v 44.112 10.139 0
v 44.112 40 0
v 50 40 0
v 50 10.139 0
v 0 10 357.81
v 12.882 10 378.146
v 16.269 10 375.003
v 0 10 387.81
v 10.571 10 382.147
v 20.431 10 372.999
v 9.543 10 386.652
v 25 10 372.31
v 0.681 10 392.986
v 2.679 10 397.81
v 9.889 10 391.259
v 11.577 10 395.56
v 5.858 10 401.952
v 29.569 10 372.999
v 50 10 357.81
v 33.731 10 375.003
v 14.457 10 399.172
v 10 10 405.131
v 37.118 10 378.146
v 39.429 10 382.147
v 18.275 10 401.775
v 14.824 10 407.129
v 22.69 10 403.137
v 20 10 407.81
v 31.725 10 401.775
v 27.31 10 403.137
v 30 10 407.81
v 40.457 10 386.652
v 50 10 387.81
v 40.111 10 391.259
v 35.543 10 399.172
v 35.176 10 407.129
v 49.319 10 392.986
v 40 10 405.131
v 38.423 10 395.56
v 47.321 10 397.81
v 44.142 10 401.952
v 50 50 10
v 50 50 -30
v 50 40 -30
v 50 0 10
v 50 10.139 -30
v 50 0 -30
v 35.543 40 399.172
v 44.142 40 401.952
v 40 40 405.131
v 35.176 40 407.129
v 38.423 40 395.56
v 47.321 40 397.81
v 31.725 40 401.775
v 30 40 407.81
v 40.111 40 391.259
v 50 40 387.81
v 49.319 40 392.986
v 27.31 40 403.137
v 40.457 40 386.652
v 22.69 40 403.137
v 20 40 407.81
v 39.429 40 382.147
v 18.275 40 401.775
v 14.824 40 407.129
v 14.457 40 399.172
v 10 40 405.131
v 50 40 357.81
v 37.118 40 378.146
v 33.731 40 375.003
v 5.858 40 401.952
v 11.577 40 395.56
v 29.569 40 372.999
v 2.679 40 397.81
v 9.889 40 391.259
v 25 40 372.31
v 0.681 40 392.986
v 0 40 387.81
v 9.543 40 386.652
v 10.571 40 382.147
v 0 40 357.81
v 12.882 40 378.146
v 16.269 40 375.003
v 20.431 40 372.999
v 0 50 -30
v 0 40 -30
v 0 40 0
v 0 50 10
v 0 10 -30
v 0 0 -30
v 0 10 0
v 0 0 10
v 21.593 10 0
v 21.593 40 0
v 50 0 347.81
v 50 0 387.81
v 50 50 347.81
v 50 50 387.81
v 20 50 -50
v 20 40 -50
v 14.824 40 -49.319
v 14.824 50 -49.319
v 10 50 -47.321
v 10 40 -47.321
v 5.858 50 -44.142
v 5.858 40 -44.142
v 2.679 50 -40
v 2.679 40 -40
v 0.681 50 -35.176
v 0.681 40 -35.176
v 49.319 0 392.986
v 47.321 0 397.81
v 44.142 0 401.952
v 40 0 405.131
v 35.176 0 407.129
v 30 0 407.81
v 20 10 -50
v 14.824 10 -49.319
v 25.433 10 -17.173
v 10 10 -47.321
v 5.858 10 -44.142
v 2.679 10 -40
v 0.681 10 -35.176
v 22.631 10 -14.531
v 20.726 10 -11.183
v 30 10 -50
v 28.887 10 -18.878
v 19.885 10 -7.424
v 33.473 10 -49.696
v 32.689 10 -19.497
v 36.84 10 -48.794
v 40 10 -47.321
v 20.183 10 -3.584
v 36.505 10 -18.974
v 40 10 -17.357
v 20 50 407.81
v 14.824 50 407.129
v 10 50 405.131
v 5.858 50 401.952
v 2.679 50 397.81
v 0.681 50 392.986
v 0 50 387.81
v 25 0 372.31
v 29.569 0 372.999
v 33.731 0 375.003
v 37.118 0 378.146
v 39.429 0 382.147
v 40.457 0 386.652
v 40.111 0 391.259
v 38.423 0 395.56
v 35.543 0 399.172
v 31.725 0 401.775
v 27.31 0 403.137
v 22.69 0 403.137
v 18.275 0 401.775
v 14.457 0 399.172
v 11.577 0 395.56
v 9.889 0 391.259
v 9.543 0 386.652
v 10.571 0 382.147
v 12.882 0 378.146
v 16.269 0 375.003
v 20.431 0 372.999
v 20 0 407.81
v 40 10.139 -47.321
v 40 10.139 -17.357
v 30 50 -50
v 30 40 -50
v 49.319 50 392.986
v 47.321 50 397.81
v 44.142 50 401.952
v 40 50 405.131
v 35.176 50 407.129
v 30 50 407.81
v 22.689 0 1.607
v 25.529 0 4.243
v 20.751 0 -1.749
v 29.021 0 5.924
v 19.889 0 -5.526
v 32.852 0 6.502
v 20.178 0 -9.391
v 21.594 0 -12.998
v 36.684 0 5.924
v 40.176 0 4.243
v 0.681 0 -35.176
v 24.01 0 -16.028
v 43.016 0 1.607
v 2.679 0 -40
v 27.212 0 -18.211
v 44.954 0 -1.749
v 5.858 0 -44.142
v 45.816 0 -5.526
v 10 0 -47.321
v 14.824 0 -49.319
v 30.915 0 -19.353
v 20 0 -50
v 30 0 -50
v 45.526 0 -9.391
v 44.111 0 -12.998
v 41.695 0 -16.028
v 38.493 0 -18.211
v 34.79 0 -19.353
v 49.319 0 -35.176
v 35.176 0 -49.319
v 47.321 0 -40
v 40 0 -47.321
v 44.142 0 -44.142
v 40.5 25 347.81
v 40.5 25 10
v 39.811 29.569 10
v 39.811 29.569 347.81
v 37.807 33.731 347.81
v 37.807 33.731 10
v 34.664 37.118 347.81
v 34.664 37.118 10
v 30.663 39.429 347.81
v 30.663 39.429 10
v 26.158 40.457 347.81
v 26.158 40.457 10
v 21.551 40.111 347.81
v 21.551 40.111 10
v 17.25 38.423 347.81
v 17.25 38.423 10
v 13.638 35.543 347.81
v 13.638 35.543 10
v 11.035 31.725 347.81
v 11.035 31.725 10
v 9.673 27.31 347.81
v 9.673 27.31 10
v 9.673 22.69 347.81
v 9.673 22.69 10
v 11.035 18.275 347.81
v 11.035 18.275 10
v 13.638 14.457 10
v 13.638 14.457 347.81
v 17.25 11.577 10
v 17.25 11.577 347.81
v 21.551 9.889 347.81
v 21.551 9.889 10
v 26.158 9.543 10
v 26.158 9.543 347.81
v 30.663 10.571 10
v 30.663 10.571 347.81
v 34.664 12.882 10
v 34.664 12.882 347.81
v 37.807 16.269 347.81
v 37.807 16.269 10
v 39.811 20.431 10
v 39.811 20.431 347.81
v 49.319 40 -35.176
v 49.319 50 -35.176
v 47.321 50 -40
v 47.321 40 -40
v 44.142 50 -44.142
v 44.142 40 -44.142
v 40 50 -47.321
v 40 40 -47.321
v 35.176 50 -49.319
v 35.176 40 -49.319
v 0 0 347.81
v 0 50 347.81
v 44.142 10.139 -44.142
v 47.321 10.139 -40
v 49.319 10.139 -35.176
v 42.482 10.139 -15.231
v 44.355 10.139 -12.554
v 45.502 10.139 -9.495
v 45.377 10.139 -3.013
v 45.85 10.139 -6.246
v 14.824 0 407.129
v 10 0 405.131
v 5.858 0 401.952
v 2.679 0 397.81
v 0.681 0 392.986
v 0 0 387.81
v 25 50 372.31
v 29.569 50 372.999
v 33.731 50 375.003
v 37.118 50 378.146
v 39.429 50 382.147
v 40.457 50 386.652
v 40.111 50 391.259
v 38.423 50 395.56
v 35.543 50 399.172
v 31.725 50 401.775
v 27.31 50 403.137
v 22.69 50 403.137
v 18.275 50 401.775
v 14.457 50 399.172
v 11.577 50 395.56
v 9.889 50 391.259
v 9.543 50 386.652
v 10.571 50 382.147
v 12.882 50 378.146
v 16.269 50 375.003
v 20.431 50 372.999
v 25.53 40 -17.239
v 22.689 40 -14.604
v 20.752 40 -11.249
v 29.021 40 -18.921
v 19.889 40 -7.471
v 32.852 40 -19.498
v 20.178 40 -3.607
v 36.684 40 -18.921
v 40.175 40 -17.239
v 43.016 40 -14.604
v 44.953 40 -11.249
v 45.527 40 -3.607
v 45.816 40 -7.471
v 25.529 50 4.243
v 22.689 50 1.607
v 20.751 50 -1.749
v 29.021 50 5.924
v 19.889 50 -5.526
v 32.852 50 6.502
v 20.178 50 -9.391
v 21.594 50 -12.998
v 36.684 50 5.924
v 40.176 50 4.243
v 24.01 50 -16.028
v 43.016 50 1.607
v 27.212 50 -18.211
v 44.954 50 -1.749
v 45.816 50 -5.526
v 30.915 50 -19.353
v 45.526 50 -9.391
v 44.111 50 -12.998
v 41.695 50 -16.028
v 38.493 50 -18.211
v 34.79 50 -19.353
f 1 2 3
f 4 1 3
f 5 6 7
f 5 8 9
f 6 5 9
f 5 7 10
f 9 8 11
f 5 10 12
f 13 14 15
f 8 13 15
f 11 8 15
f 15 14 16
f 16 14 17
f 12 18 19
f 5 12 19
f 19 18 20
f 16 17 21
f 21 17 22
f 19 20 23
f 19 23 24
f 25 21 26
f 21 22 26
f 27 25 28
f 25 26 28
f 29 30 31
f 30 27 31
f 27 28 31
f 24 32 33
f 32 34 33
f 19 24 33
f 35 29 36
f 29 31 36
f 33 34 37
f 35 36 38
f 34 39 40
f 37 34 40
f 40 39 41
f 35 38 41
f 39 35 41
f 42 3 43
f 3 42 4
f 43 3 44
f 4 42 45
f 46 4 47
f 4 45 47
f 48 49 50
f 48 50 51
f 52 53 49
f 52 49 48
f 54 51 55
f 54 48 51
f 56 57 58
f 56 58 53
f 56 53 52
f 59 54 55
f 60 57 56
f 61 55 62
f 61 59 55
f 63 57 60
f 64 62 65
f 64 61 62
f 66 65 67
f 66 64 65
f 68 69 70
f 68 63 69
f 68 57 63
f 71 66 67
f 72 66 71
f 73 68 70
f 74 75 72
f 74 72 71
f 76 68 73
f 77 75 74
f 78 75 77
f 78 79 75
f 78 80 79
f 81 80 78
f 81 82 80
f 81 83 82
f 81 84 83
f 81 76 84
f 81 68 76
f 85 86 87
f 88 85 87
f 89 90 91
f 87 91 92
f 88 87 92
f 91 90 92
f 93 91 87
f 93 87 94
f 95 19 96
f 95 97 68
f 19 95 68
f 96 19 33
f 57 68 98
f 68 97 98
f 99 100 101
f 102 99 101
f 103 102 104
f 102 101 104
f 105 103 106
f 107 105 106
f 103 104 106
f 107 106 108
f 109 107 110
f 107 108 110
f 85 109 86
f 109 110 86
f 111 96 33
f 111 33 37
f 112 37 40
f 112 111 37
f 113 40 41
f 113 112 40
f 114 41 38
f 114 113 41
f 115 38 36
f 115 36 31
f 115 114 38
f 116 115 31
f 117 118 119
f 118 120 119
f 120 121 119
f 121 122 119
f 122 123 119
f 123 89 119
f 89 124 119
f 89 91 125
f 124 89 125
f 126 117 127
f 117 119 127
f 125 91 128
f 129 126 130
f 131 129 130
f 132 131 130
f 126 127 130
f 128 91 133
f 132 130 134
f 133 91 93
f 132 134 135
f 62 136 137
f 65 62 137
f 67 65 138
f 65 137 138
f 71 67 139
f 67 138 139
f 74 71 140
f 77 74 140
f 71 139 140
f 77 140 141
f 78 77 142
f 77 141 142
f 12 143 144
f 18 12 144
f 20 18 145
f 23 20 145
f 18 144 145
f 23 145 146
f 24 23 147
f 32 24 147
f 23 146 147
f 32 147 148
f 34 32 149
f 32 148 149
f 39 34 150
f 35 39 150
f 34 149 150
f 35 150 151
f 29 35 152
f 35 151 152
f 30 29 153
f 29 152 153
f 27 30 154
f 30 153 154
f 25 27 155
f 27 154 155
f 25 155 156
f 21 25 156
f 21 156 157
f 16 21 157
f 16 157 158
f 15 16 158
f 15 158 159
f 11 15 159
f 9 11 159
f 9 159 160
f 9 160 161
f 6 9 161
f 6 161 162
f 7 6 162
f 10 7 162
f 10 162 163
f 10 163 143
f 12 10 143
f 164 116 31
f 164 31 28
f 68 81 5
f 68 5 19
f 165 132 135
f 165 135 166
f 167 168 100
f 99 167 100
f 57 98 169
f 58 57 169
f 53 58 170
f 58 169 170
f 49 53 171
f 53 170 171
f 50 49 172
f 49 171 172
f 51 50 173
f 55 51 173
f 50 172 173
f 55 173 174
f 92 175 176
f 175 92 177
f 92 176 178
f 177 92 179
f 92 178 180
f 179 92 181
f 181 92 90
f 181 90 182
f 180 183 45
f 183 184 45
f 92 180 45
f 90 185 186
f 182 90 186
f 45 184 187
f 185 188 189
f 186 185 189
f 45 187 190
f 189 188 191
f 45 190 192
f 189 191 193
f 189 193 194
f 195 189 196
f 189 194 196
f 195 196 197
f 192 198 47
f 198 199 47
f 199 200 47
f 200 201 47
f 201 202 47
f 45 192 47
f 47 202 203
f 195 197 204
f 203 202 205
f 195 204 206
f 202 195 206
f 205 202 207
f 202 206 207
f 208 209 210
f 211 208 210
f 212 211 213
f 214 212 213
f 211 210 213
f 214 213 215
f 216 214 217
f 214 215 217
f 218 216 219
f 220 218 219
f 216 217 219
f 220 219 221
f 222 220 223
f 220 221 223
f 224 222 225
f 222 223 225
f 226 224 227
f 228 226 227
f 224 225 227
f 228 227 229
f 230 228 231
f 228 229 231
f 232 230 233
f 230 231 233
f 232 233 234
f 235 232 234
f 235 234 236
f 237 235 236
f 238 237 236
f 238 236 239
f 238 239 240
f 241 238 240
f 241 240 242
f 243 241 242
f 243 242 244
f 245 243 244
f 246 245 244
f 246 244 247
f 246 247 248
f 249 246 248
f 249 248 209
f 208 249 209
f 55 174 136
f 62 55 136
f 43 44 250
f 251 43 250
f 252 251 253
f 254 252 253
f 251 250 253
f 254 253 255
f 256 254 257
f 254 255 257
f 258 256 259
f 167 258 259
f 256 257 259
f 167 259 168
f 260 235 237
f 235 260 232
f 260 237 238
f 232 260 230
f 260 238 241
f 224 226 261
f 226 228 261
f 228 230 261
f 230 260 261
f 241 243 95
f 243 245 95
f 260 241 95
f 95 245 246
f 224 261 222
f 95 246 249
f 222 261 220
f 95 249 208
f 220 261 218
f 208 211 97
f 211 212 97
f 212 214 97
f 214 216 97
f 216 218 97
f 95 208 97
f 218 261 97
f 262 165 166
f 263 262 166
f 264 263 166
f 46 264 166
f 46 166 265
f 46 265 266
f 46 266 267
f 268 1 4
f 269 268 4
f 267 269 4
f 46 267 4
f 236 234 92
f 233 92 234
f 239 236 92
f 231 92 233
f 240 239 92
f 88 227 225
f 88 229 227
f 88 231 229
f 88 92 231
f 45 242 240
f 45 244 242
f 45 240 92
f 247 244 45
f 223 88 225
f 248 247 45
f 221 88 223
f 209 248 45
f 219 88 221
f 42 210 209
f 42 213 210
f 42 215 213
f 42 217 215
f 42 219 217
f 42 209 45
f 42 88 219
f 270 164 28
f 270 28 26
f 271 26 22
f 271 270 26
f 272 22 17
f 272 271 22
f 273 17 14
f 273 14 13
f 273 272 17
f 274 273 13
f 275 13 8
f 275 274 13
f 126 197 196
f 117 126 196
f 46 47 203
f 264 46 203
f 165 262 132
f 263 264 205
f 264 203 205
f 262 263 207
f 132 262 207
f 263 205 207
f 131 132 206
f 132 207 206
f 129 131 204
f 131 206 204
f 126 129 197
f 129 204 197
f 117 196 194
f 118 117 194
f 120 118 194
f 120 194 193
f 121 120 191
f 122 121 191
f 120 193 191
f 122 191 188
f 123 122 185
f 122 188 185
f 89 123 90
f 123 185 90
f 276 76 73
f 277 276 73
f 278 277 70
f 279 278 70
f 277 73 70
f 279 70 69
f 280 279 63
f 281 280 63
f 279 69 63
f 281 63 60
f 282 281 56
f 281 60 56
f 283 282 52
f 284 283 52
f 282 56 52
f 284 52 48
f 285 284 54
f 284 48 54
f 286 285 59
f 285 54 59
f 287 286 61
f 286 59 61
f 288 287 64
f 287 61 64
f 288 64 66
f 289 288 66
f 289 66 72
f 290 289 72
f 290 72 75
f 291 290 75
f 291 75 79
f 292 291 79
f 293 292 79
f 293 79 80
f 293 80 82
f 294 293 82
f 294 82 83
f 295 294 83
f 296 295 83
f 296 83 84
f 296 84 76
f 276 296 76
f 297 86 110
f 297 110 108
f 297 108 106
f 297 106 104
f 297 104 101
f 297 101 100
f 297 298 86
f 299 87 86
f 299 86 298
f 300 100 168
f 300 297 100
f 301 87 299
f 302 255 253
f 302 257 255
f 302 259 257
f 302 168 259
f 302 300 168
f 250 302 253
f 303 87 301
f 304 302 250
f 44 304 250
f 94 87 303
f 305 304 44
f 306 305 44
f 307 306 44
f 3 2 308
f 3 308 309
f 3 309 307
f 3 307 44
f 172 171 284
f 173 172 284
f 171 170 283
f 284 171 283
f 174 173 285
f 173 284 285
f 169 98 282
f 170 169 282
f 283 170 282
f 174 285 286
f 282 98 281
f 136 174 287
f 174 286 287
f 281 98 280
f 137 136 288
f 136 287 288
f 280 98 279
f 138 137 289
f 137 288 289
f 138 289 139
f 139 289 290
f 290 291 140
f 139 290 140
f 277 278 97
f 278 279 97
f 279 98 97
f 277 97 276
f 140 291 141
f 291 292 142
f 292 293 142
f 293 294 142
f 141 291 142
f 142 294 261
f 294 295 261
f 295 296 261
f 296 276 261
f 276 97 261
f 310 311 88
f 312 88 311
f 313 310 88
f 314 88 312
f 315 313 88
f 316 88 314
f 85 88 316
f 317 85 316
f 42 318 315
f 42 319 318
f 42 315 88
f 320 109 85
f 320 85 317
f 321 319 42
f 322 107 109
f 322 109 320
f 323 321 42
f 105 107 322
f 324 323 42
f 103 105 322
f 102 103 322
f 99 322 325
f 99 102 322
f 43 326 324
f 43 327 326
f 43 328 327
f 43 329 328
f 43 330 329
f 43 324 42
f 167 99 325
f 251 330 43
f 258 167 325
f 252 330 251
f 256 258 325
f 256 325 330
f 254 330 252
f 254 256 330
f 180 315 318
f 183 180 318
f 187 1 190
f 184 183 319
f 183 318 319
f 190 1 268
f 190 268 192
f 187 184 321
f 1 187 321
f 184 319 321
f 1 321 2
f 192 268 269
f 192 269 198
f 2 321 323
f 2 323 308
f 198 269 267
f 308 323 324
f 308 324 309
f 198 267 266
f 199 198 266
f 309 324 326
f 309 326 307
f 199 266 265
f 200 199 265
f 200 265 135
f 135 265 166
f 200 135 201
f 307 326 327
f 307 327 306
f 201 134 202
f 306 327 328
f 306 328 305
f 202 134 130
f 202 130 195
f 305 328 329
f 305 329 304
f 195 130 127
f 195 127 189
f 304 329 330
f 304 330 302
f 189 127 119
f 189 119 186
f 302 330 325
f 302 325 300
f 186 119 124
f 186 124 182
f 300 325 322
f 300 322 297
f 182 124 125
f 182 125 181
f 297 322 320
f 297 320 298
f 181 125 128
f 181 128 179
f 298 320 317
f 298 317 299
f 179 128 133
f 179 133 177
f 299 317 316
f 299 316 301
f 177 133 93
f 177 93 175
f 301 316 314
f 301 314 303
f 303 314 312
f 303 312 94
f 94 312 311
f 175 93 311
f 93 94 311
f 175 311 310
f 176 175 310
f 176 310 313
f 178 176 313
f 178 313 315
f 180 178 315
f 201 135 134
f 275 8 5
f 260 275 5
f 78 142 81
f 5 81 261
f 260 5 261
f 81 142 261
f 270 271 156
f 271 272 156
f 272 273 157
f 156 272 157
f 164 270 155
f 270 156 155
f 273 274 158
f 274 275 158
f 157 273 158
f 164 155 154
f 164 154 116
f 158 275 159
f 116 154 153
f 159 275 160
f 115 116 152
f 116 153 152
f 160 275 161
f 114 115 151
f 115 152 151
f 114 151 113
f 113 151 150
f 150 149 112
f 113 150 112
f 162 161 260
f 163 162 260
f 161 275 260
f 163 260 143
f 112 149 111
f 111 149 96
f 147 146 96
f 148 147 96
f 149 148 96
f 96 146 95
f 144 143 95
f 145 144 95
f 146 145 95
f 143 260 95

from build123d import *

# Parameters (mm, degrees)
SKETCH1_W             = 50
SKETCH1_H             = 50
BOSS_EXTRUDE1_DEPTH   = 10
BOSS_EXTRUDE1_2_DEPTH = 10
BOSS_EXTRUDE2_DEPTH   = 50
SKETCH3_W             = 30
SKETCH3_H             = 30
CUT_EXTRUDE1_DEPTH    = 90
SKETCH4_W             = 10
SKETCH4_H             = 29.860616381
SKETCH4_H_2           = 30
CUT_EXTRUDE2_DEPTH    = 90
SKETCH5_W             = 50
SKETCH5_H             = 50
BOSS_EXTRUDE3_DEPTH   = 10
SKETCH6_R             = 12
CUT_EXTRUDE3_DEPTH    = 80
SKETCH13_W            = 50
SKETCH13_H            = 50
CUT_EXTRUDE5_DEPTH    = 160
BOSS_EXTRUDE4_DEPTH   = 337.81
SKETCH14_W            = 50
SKETCH14_H            = 50
BOSS_EXTRUDE5_DEPTH   = 10
BOSS_EXTRUDE6_DEPTH   = 10
BOSS_EXTRUDE7_DEPTH   = 10
SKETCH17_R            = 15.5
CUT_EXTRUDE6_DEPTH    = 70
SKETCH19_R            = 12.7
CUT_EXTRUDE7_DEPTH    = 70
SKETCH20_R            = 12.7
BOSS_EXTRUDE11_DEPTH  = 10
SKETCH26_R            = 12
BOSS_EXTRUDE12_DEPTH  = 10
SKETCH27_R            = 13
CUT_EXTRUDE8_DEPTH    = 70


with BuildPart() as part:
    # Sketch1 → Boss-Extrude1 (new body)
    with BuildSketch(Plane.XY):
        with Locations((25, 25)):
            Rectangle(SKETCH1_W, SKETCH1_H)
    extrude(amount=BOSS_EXTRUDE1_DEPTH)

    # Sketch2 → Boss-Extrude2 (add)
    with BuildSketch(Plane(origin=(0, 0, 0), x_dir=(1, 0, 0), z_dir=(0, 1, 0))):
        with BuildLine():
            Line((0, 0), (50, 0))
            Line((50, 0), (50, 30))
            ThreePointArc((50, 30), (44.142135624, 44.142135624), (30, 50))
            Line((30, 50), (20, 50))
            ThreePointArc((20, 50), (5.857864376, 44.142135624), (0, 30))
            Line((0, 30), (0, 0))
        make_face()
    extrude(amount=BOSS_EXTRUDE2_DEPTH)

    # Sketch3 → Cut-Extrude1 (cut)
    with BuildSketch(Plane.XY.offset(10)):
        with Locations((25, 25)):
            Rectangle(SKETCH3_W, SKETCH3_H)
    extrude(amount=-CUT_EXTRUDE1_DEPTH, mode=Mode.SUBTRACT)

    # Sketch4 → Cut-Extrude2 (cut)
    with BuildSketch(Plane.XY.offset(10)):
        with Locations((45, 25.06969181)):
            Rectangle(SKETCH4_W, SKETCH4_H)
        with Locations((5, 25)):
            Rectangle(SKETCH4_W, SKETCH4_H_2)
    extrude(amount=-CUT_EXTRUDE2_DEPTH, mode=Mode.SUBTRACT)


with BuildPart() as body_2:
    # Sketch1 → Boss-Extrude1 2 (new body)
    with BuildSketch(Plane.XY):
        with Locations((25, -320)):
            Rectangle(SKETCH1_W, SKETCH1_H)
    extrude(amount=BOSS_EXTRUDE1_2_DEPTH)

    # Sketch13 → Cut-Extrude5 (cut)
    with BuildSketch(Plane(origin=(0, 0, 0), x_dir=(-1, 0, 0), z_dir=(0, 0, -1))):
        with Locations((-25, -320)):
            Rectangle(SKETCH13_W, SKETCH13_H)
    extrude(amount=-CUT_EXTRUDE5_DEPTH, mode=Mode.SUBTRACT)


with BuildPart() as cut_extrude2_piece_1:
    # of the separate pieces the step leaves, piece 1, a body of its own (cut_extrude2_pieces)
    add(part.part.solids().sort_by_distance((0, 0, 10))[0])



with BuildPart() as cut_extrude2_piece_2:
    # of the separate pieces the step leaves, piece 2, a body of its own (cut_extrude2_pieces)
    add(part.part.solids().sort_by_distance((0, 50, 10))[0])


with BuildPart() as cut_extrude2_piece_1_1:
    add(cut_extrude2_piece_1.part)

    add(cut_extrude2_piece_2.part)  # Boss-Extrude3 merges Cut-Extrude2 piece 2
    # Sketch5 → Boss-Extrude3 (add)
    with BuildSketch(Plane.XY.offset(10)):
        with Locations((25, 25)):
            Rectangle(SKETCH5_W, SKETCH5_H)
    extrude(amount=-BOSS_EXTRUDE3_DEPTH)

    # Sketch6 → Cut-Extrude3 (cut)
    with BuildSketch(Plane.XZ):
        with Locations((25, -30)):
            Circle(SKETCH6_R)
    extrude(amount=-CUT_EXTRUDE3_DEPTH, mode=Mode.SUBTRACT)

    # Sketch7 → Boss-Extrude4 (add)
    with BuildSketch(Plane.XY.offset(10)):
        with BuildLine():
            ThreePointArc((25, 40.5), (14.039844892, 14.039844892), (40.5, 25))
            ThreePointArc((40.5, 25), (35.960155108, 35.960155108), (25, 40.5))
        make_face()
    extrude(amount=BOSS_EXTRUDE4_DEPTH)

    # Sketch14 → Boss-Extrude5 (add)
    with BuildSketch(Plane.XY.offset(347.81)):
        with Locations((25, 25)):
            Rectangle(SKETCH14_W, SKETCH14_H)
    extrude(amount=BOSS_EXTRUDE5_DEPTH)

    # Sketch15 → Boss-Extrude6 (add)
    with BuildSketch(Plane(origin=(0, 50, 0), x_dir=(1, 0, 0), z_dir=(0, 1, 0))):
        with BuildLine():
            Line((0, -357.81), (50, -357.81))
            Line((50, -357.81), (50, -387.81))
            ThreePointArc((50, -387.81), (44.142135624, -401.952135624), (30, -407.81))
            Line((30, -407.81), (20, -407.81))
            ThreePointArc((20, -407.81), (5.857864376, -401.952135624), (0, -387.81))
            Line((0, -387.81), (0, -357.81))
        make_face()
    extrude(amount=-BOSS_EXTRUDE6_DEPTH)

    # Sketch16 → Boss-Extrude7 (add)
    with BuildSketch(Plane.XZ):
        with BuildLine():
            Line((0, 347.81), (50, 347.81))
            Line((50, 347.81), (50, 387.81))
            ThreePointArc((50, 387.81), (44.142135624, 401.952135624), (30, 407.81))
            Line((30, 407.81), (20, 407.81))
            ThreePointArc((20, 407.81), (5.857864376, 401.952135624), (0, 387.81))
            Line((0, 387.81), (0, 347.81))
        make_face()
    extrude(amount=-BOSS_EXTRUDE7_DEPTH)

    # Sketch17 → Cut-Extrude6 (cut)
    with BuildSketch(Plane.XZ):
        with Locations((25, 387.81)):
            Circle(SKETCH17_R)
    extrude(amount=-CUT_EXTRUDE6_DEPTH, mode=Mode.SUBTRACT)

    # Sketch19 → Cut-Extrude7 (cut)
    with BuildSketch(Plane.XZ):
        with Locations((32.852399557, -6.497982337)):
            Circle(SKETCH19_R)
    extrude(amount=-CUT_EXTRUDE7_DEPTH, mode=Mode.SUBTRACT)

    # Sketch20 → Boss-Extrude11 (add)
    with BuildSketch(Plane.XZ):
        with Locations((25, -30)):
            Circle(SKETCH20_R)
    extrude(amount=-BOSS_EXTRUDE11_DEPTH)

    # Sketch26 → Boss-Extrude12 (add)
    with BuildSketch(Plane(origin=(0, 50, 0), x_dir=(1, 0, 0), z_dir=(0, 1, 0))):
        with Locations((25, 30)):
            Circle(SKETCH26_R)
    extrude(amount=-BOSS_EXTRUDE12_DEPTH)

    # Sketch27 → Cut-Extrude8 (cut)
    with BuildSketch(Plane(origin=(0, 50, 0), x_dir=(1, 0, 0), z_dir=(0, 1, 0))):
        with Locations((32.852399557, 6.497982337)):
            Circle(SKETCH27_R)
    extrude(amount=-CUT_EXTRUDE8_DEPTH, mode=Mode.SUBTRACT)


solid = cut_extrude2_piece_1_1.part
